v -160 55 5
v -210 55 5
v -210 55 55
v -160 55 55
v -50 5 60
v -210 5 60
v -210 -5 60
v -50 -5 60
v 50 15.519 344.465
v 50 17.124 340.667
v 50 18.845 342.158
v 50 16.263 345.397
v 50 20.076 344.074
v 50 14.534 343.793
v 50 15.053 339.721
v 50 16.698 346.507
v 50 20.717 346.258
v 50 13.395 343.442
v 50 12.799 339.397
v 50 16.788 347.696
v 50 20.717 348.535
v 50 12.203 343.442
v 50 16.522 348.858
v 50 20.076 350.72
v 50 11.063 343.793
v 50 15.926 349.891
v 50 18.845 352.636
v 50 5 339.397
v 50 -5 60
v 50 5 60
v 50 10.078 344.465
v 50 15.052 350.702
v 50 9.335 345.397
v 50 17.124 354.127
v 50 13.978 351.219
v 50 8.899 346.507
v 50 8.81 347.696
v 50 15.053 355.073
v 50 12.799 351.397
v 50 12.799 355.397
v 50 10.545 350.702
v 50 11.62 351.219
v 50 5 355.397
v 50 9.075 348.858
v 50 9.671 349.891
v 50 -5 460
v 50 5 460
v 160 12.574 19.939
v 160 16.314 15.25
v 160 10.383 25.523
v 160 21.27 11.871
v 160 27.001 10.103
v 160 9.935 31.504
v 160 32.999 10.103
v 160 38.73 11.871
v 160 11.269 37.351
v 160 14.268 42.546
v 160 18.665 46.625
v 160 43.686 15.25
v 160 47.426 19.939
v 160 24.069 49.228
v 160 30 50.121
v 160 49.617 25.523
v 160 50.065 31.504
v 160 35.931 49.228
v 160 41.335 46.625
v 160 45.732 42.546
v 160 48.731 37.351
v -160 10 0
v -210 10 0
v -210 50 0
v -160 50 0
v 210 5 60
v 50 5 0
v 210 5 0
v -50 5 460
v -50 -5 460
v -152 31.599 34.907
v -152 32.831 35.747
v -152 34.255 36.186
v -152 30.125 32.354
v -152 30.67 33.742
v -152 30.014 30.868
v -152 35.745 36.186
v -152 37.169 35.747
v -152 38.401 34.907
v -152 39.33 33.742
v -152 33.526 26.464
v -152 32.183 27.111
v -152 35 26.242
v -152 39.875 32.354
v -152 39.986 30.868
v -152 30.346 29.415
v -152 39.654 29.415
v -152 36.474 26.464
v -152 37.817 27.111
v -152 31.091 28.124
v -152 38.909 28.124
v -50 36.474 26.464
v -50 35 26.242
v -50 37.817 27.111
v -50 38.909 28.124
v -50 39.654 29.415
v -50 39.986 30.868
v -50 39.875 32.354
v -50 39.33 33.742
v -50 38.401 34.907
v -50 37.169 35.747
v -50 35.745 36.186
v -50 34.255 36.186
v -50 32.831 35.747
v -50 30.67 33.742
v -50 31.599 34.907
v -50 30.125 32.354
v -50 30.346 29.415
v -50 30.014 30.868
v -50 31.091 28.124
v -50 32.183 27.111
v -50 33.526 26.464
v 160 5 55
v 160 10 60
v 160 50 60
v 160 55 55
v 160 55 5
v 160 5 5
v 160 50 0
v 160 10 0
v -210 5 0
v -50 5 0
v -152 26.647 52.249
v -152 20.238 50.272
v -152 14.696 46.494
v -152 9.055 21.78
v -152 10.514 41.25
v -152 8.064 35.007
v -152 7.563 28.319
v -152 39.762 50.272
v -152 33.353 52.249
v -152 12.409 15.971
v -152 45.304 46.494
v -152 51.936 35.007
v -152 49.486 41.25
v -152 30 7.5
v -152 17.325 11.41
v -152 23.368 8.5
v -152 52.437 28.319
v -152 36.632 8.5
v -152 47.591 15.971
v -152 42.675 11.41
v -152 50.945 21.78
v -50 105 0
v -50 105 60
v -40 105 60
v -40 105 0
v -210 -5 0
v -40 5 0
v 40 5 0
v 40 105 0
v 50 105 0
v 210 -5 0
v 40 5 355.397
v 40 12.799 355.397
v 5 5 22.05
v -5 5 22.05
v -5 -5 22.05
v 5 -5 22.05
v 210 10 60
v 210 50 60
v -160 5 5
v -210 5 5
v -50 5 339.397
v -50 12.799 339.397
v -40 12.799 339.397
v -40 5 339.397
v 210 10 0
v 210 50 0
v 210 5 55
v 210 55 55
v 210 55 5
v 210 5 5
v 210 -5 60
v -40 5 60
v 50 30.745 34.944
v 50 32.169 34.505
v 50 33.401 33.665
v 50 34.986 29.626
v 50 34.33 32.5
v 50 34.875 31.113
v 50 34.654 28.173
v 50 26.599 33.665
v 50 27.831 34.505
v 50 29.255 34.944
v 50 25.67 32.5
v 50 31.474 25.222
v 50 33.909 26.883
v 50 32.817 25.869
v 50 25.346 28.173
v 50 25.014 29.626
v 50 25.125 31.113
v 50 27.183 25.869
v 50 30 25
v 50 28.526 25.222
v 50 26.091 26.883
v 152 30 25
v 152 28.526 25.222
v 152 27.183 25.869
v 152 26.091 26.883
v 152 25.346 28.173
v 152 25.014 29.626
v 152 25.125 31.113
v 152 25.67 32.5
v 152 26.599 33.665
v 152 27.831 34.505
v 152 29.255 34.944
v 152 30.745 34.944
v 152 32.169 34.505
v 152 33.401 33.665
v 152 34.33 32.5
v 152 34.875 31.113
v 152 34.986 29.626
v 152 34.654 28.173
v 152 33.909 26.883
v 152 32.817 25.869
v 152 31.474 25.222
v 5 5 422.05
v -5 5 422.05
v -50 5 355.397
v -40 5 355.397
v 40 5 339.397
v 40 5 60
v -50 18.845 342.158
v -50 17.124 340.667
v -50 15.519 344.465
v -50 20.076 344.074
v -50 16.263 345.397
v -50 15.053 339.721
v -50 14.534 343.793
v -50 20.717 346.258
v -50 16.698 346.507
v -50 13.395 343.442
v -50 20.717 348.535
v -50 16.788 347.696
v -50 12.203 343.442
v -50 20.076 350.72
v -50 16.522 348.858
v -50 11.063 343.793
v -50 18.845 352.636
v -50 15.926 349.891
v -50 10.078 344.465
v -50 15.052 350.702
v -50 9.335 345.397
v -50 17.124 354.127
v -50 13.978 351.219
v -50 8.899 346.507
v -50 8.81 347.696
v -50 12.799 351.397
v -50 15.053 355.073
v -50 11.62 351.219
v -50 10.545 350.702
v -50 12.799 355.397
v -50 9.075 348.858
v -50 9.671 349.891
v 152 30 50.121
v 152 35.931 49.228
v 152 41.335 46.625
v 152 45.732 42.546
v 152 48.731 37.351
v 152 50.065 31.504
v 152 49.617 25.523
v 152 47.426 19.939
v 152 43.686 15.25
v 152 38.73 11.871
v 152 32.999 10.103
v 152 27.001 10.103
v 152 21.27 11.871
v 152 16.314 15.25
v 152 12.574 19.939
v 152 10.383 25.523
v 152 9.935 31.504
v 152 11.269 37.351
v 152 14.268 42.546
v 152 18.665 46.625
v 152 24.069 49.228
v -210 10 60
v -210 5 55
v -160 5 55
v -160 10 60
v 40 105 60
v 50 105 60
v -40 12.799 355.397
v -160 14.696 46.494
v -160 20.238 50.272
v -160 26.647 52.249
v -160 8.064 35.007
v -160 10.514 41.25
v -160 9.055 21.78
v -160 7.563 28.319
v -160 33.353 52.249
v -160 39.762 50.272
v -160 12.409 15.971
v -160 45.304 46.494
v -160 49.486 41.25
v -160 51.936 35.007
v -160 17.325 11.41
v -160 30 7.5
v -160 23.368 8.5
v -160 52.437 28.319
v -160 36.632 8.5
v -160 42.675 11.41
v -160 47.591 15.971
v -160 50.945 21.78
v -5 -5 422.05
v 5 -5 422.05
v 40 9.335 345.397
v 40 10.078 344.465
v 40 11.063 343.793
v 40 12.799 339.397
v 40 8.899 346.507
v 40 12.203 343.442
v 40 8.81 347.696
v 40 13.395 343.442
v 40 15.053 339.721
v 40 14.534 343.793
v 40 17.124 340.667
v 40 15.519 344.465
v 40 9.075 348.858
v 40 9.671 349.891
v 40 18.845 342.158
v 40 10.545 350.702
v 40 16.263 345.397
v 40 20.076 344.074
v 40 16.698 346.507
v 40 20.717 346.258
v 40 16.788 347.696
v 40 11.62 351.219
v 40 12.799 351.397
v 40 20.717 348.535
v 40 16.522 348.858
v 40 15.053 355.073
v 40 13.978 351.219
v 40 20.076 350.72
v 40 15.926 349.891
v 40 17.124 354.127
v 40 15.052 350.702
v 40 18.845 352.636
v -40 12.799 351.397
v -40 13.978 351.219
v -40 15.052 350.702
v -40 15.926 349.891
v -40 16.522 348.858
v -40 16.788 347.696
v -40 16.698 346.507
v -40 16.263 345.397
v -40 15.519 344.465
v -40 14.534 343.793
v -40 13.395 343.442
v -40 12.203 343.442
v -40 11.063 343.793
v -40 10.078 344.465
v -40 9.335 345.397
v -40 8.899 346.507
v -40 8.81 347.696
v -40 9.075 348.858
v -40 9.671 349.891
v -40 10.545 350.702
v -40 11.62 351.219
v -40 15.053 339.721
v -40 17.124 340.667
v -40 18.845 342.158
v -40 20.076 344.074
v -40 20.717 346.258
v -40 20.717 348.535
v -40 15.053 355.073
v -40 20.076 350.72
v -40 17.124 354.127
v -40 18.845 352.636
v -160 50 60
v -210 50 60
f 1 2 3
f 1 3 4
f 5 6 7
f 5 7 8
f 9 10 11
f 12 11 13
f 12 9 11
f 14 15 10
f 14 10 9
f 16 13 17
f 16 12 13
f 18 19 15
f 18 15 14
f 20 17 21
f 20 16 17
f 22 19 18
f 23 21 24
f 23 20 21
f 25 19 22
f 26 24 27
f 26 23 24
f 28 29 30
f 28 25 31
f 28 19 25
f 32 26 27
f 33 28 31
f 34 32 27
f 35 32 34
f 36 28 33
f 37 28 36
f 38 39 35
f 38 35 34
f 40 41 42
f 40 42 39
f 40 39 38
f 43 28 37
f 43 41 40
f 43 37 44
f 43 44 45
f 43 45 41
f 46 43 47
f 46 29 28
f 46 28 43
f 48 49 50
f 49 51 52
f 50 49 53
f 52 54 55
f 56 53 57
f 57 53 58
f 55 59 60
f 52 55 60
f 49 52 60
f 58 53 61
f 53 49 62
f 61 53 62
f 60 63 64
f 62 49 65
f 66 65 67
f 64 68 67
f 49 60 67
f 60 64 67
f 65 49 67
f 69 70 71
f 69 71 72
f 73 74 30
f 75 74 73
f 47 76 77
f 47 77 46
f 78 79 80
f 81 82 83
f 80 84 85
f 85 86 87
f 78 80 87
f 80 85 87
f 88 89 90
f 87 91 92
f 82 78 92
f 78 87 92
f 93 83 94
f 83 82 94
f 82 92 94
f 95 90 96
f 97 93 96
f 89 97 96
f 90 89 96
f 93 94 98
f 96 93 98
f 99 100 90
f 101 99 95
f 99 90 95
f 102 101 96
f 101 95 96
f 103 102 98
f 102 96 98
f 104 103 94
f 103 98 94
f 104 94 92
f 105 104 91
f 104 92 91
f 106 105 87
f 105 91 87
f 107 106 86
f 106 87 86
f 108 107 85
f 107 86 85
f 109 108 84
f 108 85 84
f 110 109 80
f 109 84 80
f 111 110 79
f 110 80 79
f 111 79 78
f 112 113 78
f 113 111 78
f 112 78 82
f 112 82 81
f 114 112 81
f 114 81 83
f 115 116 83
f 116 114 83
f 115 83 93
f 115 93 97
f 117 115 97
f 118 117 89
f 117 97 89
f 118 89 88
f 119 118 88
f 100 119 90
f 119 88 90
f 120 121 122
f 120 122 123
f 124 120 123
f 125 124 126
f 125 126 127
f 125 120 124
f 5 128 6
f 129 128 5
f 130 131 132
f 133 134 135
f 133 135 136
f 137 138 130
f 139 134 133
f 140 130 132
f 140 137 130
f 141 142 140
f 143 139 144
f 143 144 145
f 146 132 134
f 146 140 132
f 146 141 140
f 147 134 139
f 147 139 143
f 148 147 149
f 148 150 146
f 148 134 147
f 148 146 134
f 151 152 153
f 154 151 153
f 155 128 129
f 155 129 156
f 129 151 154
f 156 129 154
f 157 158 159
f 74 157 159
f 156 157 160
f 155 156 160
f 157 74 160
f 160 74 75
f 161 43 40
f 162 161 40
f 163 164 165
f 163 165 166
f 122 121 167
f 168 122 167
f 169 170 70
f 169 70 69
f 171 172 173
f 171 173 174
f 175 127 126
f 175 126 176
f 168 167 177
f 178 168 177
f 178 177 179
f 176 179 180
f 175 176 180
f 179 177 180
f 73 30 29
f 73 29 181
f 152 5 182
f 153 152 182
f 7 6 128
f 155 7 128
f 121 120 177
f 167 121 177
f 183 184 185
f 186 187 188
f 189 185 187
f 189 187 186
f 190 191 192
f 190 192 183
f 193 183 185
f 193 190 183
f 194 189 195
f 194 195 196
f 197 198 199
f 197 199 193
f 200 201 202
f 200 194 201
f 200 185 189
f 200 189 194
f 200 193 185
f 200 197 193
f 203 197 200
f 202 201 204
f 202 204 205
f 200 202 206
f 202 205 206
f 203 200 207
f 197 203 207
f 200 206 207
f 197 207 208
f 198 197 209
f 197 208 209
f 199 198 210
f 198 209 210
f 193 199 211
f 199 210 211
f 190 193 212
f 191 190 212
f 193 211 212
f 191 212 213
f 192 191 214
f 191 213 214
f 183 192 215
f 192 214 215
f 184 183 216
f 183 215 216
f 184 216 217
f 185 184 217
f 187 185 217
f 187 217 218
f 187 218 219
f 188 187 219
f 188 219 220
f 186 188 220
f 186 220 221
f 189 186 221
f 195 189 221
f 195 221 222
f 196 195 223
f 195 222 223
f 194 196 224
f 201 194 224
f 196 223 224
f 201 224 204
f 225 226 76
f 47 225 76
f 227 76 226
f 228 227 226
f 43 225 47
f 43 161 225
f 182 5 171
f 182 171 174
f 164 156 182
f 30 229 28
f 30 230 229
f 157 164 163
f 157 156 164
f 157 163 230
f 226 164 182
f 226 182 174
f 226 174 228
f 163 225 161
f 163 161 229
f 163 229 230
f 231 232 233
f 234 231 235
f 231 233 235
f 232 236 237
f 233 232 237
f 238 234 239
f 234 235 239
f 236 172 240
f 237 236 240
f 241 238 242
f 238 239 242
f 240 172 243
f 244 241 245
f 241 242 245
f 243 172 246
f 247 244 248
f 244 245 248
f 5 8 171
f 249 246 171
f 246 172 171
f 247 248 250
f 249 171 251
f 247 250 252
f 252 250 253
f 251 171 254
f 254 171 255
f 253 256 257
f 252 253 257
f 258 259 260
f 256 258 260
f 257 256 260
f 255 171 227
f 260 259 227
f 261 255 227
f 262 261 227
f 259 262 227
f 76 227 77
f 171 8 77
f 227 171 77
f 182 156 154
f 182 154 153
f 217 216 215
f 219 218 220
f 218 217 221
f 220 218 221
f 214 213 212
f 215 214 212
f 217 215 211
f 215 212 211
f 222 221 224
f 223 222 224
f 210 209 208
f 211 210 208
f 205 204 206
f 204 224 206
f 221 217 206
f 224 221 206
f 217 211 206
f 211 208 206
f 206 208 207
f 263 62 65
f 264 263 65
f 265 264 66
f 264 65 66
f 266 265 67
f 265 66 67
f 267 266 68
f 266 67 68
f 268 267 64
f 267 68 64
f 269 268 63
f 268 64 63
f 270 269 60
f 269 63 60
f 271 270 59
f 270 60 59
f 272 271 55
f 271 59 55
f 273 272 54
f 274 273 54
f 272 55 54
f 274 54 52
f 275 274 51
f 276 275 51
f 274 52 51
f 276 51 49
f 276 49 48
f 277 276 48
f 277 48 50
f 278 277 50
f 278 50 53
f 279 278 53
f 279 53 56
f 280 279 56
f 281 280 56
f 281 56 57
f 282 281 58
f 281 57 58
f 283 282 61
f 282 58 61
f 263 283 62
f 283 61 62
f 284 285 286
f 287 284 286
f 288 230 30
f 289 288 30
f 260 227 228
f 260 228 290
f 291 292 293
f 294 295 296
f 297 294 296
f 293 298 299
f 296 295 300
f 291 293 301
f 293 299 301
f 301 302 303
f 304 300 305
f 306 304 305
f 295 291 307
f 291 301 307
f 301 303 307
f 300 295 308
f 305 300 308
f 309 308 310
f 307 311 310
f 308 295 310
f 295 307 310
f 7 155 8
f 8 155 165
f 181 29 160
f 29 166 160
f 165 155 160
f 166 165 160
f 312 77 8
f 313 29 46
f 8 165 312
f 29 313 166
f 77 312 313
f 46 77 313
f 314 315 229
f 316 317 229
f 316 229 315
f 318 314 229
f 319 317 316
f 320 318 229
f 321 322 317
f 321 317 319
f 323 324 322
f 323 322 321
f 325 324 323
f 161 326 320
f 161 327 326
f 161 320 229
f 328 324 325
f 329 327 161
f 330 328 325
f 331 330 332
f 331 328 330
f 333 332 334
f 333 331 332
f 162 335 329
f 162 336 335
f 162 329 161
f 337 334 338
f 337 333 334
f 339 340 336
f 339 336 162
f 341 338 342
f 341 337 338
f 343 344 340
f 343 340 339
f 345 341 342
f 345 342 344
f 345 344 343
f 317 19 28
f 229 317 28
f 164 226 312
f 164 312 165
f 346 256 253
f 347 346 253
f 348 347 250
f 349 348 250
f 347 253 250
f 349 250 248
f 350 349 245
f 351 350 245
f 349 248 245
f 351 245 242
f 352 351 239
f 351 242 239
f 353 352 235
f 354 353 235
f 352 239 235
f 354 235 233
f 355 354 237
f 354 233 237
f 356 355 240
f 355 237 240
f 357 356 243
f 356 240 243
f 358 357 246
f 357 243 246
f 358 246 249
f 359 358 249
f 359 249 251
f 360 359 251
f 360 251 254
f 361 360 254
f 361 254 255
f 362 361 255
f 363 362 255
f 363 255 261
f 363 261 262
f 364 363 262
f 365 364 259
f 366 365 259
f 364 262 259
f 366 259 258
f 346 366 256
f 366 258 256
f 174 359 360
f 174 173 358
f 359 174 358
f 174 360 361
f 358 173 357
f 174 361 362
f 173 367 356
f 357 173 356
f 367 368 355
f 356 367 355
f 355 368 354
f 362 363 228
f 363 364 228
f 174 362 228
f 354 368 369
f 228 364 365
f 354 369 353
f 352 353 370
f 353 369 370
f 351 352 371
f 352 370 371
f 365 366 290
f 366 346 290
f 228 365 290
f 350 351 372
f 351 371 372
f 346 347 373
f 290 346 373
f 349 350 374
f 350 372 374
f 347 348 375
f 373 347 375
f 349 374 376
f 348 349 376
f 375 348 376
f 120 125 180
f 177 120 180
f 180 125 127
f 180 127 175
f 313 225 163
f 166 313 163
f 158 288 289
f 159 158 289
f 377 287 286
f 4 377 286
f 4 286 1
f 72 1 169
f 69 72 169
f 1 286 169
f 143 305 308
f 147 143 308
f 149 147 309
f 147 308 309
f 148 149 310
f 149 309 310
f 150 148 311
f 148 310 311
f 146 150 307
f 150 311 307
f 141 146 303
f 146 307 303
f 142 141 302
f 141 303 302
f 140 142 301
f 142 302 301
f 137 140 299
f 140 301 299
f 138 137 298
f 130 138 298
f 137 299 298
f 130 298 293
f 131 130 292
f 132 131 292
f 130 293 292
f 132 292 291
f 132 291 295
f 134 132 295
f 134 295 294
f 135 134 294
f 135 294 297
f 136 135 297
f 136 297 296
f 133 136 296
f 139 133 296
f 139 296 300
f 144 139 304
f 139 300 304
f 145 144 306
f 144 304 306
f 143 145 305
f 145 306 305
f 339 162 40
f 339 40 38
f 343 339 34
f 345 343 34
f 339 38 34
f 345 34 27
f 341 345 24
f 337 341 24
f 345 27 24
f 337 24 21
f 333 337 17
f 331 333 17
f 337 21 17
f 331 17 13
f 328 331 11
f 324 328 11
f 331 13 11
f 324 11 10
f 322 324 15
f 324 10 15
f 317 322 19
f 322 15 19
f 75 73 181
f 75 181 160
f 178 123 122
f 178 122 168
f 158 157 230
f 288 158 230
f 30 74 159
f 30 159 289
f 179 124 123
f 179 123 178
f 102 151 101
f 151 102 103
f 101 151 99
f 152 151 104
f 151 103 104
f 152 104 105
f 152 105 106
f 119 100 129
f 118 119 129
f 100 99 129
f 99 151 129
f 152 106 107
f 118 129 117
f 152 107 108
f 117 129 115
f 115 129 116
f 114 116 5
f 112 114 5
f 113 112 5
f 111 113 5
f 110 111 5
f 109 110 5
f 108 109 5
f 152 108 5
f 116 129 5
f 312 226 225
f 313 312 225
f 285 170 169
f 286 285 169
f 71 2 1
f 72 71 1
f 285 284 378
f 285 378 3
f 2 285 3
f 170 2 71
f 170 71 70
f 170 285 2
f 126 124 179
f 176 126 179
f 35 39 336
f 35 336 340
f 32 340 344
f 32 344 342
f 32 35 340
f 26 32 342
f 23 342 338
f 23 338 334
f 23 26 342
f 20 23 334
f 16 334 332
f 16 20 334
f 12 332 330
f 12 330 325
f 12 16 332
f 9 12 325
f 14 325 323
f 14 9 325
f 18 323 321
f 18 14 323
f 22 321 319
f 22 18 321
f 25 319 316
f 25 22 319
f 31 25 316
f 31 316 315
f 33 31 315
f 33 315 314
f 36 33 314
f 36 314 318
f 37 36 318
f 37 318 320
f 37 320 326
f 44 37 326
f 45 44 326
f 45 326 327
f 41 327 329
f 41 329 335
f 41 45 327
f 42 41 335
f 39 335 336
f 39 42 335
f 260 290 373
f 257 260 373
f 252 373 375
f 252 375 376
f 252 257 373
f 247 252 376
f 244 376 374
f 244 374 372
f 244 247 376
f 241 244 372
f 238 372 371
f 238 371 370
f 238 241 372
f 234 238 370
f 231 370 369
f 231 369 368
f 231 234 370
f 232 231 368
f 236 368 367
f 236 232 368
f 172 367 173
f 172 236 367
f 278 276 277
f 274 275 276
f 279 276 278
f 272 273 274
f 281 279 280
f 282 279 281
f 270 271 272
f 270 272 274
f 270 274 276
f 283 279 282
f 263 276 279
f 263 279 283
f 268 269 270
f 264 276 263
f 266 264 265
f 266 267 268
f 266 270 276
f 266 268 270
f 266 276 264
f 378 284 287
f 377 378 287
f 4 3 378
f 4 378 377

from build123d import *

# Parameters (mm, degrees)
SKETCH_1_W          = 100
SKETCH_1_H          = 10
EXTRUDE_1_DEPTH     = 460
SKETCH_2_W          = 10
SKETCH_2_H          = 400
CUT_EXTRUDE_1_DEPTH = 460
SKETCH_4_R          = 4
EXTRUDE_2_DEPTH     = 10
EXTRUDE_START       = -10
SKETCH_5_W          = 10
SKETCH_5_H          = 60
EXTRUDE_3_DEPTH     = 100
EXTRUDE_3_2_DEPTH   = 100
SKETCH_6_W          = 160
SKETCH_6_H          = 60
EXTRUDE_4_DEPTH     = 10
SKETCH_7_W          = 50
SKETCH_7_H          = 60
EXTRUDE_5_DEPTH     = 50
EXTRUDE_5_2_DEPTH   = 50
CHAMFER_1_SIZE      = 5
CHAMFER_2_SIZE      = 5
SKETCH_8_R          = 20.121485443
EXTRUDE_6_DEPTH     = 8
SKETCH_9_R          = 22.5
EXTRUDE_7_DEPTH     = 8
SKETCH_10_R         = 5
EXTRUDE_8_DEPTH     = 102
SKETCH_11_R         = 5
EXTRUDE_9_DEPTH     = 108


with BuildPart() as part:
    # 草图1 → 凸台-拉伸1 (new body)
    with BuildSketch(Plane.XY):
        Rectangle(SKETCH_1_W, SKETCH_1_H)
    extrude(amount=EXTRUDE_1_DEPTH)

    # 草图2 → 切除-拉伸1 (cut)
    with BuildSketch(Plane(origin=(0, 5, 0), x_dir=(1, 0, 0), z_dir=(0, 1, 0))):
        with Locations((0, -222.049931505)):
            Rectangle(SKETCH_2_W, SKETCH_2_H)
    extrude(amount=-CUT_EXTRUDE_1_DEPTH, mode=Mode.SUBTRACT)

    # 草图4 → 凸台-拉伸2 (add)
    with BuildSketch(Plane.ZY.offset(50)):
        with BuildLine():
            ThreePointArc((355.396917132, 12.798688849), (347.396917132, 20.798688849), (339.396917132, 12.798688849))
            Line((339.396917132, 12.798688849), (339.396917132, 5))
            Line((339.396917132, 5), (346.520803495, 5))
            Line((346.520803495, 5), (355.396917132, 5))
            Line((355.396917132, 5), (355.396917132, 12.798688849))
        make_face()
        with Locations((347.396917132, 12.798688849)):
            Circle(SKETCH_4_R, mode=Mode.SUBTRACT)
    extrude_2 = extrude(amount=-EXTRUDE_2_DEPTH)

    # 镜向1: 凸台-拉伸2 across plane
    add(extrude_2.mirror(Plane(origin=(0, 0, 0), x_dir=(0, 0, 1), z_dir=(1, 0, 0))))



with BuildPart() as body_2:
    # 草图5 → 凸台-拉伸3 (new body)
    with BuildSketch(Plane.XZ.offset(5).offset(EXTRUDE_START)):
        with Locations((-45, 30)):
            Rectangle(SKETCH_5_W, SKETCH_5_H)
    extrude(amount=-EXTRUDE_3_DEPTH)


with BuildPart() as body_3:
    # 草图5 → Extrude 3 2 (new body)
    with BuildSketch(Plane.XZ.offset(5).offset(EXTRUDE_START)):
        with Locations((45, 30)):
            Rectangle(SKETCH_5_W, SKETCH_5_H)
    extrude(amount=-EXTRUDE_3_2_DEPTH)


with BuildPart() as part_1:
    add(part.part)

    add(body_2.part)  # 凸台-拉伸4 merges body 2

    add(body_3.part)  # 凸台-拉伸4 merges body 3
    # 草图6 → 凸台-拉伸4 (add)
    with BuildSketch(Plane(origin=(0, 5, 0), x_dir=(1, 0, 0), z_dir=(0, 1, 0))):
        with Locations((130, -30)):
            Rectangle(SKETCH_6_W, SKETCH_6_H)
        with Locations((-130, -30)):
            Rectangle(SKETCH_6_W, SKETCH_6_H)
    extrude(amount=-EXTRUDE_4_DEPTH)

    # 草图11 → 凸台-拉伸9 (add)
    with BuildSketch(Plane(origin=(-152, 0, 0), x_dir=(0, 0, -1), z_dir=(1, 0, 0))):
        with Locations((-31.241708383, 35)):
            Circle(SKETCH_11_R)
    extrude(amount=EXTRUDE_9_DEPTH)


with BuildPart() as body_2_2:
    # 草图7 → 凸台-拉伸5 (new body)
    with BuildSketch(Plane(origin=(0, 5, 0), x_dir=(1, 0, 0), z_dir=(0, 1, 0))):
        with Locations((-185, -30)):
            Rectangle(SKETCH_7_W, SKETCH_7_H)
    extrude(amount=EXTRUDE_5_DEPTH)

    # 倒角1
    chamfer_1_edges = [body_2_2.edges().sort_by_distance(p)[0] for p in [
        (-185, 55, 0),
        (-185, 5, 0),
        (-185, 5, 60),
        (-185, 55, 60),
    ]]
    chamfer(chamfer_1_edges, length=CHAMFER_1_SIZE)


with BuildPart() as body_3_2:
    # 草图7 → Extrude 5 2 (new body)
    with BuildSketch(Plane(origin=(0, 5, 0), x_dir=(1, 0, 0), z_dir=(0, 1, 0))):
        with Locations((185, -30)):
            Rectangle(SKETCH_7_W, SKETCH_7_H)
    extrude(amount=EXTRUDE_5_2_DEPTH)

    # 倒角2
    chamfer_2_edges = [body_3_2.edges().sort_by_distance(p)[0] for p in [
        (185, 55, 60),
        (185, 5, 60),
        (185, 5, 0),
        (185, 55, 0),
    ]]
    chamfer(chamfer_2_edges, length=CHAMFER_2_SIZE)


with BuildPart() as body_4:
    # 草图8 → 凸台-拉伸6 (new body)
    with BuildSketch(Plane.ZY.offset(-160)):
        with Locations((30, 30)):
            Circle(SKETCH_8_R)
    extrude(amount=EXTRUDE_6_DEPTH)


with BuildPart() as body_5:
    # 草图9 → 凸台-拉伸7 (new body)
    with BuildSketch(Plane(origin=(-160, 0, 0), x_dir=(0, 0, -1), z_dir=(1, 0, 0))):
        with Locations((-30, 30)):
            Circle(SKETCH_9_R)
    extrude(amount=EXTRUDE_7_DEPTH)


with BuildPart() as body_6:
    # 草图10 → 凸台-拉伸8 (new body)
    with BuildSketch(Plane.ZY.offset(-152)):
        with Locations(Location((30, 30, 0), (0, 0, 180))):
            Circle(SKETCH_10_R)
    extrude(amount=EXTRUDE_8_DEPTH)


solid = Compound([part_1.part, body_2_2.part, body_3_2.part, body_4.part, body_5.part, body_6.part])
